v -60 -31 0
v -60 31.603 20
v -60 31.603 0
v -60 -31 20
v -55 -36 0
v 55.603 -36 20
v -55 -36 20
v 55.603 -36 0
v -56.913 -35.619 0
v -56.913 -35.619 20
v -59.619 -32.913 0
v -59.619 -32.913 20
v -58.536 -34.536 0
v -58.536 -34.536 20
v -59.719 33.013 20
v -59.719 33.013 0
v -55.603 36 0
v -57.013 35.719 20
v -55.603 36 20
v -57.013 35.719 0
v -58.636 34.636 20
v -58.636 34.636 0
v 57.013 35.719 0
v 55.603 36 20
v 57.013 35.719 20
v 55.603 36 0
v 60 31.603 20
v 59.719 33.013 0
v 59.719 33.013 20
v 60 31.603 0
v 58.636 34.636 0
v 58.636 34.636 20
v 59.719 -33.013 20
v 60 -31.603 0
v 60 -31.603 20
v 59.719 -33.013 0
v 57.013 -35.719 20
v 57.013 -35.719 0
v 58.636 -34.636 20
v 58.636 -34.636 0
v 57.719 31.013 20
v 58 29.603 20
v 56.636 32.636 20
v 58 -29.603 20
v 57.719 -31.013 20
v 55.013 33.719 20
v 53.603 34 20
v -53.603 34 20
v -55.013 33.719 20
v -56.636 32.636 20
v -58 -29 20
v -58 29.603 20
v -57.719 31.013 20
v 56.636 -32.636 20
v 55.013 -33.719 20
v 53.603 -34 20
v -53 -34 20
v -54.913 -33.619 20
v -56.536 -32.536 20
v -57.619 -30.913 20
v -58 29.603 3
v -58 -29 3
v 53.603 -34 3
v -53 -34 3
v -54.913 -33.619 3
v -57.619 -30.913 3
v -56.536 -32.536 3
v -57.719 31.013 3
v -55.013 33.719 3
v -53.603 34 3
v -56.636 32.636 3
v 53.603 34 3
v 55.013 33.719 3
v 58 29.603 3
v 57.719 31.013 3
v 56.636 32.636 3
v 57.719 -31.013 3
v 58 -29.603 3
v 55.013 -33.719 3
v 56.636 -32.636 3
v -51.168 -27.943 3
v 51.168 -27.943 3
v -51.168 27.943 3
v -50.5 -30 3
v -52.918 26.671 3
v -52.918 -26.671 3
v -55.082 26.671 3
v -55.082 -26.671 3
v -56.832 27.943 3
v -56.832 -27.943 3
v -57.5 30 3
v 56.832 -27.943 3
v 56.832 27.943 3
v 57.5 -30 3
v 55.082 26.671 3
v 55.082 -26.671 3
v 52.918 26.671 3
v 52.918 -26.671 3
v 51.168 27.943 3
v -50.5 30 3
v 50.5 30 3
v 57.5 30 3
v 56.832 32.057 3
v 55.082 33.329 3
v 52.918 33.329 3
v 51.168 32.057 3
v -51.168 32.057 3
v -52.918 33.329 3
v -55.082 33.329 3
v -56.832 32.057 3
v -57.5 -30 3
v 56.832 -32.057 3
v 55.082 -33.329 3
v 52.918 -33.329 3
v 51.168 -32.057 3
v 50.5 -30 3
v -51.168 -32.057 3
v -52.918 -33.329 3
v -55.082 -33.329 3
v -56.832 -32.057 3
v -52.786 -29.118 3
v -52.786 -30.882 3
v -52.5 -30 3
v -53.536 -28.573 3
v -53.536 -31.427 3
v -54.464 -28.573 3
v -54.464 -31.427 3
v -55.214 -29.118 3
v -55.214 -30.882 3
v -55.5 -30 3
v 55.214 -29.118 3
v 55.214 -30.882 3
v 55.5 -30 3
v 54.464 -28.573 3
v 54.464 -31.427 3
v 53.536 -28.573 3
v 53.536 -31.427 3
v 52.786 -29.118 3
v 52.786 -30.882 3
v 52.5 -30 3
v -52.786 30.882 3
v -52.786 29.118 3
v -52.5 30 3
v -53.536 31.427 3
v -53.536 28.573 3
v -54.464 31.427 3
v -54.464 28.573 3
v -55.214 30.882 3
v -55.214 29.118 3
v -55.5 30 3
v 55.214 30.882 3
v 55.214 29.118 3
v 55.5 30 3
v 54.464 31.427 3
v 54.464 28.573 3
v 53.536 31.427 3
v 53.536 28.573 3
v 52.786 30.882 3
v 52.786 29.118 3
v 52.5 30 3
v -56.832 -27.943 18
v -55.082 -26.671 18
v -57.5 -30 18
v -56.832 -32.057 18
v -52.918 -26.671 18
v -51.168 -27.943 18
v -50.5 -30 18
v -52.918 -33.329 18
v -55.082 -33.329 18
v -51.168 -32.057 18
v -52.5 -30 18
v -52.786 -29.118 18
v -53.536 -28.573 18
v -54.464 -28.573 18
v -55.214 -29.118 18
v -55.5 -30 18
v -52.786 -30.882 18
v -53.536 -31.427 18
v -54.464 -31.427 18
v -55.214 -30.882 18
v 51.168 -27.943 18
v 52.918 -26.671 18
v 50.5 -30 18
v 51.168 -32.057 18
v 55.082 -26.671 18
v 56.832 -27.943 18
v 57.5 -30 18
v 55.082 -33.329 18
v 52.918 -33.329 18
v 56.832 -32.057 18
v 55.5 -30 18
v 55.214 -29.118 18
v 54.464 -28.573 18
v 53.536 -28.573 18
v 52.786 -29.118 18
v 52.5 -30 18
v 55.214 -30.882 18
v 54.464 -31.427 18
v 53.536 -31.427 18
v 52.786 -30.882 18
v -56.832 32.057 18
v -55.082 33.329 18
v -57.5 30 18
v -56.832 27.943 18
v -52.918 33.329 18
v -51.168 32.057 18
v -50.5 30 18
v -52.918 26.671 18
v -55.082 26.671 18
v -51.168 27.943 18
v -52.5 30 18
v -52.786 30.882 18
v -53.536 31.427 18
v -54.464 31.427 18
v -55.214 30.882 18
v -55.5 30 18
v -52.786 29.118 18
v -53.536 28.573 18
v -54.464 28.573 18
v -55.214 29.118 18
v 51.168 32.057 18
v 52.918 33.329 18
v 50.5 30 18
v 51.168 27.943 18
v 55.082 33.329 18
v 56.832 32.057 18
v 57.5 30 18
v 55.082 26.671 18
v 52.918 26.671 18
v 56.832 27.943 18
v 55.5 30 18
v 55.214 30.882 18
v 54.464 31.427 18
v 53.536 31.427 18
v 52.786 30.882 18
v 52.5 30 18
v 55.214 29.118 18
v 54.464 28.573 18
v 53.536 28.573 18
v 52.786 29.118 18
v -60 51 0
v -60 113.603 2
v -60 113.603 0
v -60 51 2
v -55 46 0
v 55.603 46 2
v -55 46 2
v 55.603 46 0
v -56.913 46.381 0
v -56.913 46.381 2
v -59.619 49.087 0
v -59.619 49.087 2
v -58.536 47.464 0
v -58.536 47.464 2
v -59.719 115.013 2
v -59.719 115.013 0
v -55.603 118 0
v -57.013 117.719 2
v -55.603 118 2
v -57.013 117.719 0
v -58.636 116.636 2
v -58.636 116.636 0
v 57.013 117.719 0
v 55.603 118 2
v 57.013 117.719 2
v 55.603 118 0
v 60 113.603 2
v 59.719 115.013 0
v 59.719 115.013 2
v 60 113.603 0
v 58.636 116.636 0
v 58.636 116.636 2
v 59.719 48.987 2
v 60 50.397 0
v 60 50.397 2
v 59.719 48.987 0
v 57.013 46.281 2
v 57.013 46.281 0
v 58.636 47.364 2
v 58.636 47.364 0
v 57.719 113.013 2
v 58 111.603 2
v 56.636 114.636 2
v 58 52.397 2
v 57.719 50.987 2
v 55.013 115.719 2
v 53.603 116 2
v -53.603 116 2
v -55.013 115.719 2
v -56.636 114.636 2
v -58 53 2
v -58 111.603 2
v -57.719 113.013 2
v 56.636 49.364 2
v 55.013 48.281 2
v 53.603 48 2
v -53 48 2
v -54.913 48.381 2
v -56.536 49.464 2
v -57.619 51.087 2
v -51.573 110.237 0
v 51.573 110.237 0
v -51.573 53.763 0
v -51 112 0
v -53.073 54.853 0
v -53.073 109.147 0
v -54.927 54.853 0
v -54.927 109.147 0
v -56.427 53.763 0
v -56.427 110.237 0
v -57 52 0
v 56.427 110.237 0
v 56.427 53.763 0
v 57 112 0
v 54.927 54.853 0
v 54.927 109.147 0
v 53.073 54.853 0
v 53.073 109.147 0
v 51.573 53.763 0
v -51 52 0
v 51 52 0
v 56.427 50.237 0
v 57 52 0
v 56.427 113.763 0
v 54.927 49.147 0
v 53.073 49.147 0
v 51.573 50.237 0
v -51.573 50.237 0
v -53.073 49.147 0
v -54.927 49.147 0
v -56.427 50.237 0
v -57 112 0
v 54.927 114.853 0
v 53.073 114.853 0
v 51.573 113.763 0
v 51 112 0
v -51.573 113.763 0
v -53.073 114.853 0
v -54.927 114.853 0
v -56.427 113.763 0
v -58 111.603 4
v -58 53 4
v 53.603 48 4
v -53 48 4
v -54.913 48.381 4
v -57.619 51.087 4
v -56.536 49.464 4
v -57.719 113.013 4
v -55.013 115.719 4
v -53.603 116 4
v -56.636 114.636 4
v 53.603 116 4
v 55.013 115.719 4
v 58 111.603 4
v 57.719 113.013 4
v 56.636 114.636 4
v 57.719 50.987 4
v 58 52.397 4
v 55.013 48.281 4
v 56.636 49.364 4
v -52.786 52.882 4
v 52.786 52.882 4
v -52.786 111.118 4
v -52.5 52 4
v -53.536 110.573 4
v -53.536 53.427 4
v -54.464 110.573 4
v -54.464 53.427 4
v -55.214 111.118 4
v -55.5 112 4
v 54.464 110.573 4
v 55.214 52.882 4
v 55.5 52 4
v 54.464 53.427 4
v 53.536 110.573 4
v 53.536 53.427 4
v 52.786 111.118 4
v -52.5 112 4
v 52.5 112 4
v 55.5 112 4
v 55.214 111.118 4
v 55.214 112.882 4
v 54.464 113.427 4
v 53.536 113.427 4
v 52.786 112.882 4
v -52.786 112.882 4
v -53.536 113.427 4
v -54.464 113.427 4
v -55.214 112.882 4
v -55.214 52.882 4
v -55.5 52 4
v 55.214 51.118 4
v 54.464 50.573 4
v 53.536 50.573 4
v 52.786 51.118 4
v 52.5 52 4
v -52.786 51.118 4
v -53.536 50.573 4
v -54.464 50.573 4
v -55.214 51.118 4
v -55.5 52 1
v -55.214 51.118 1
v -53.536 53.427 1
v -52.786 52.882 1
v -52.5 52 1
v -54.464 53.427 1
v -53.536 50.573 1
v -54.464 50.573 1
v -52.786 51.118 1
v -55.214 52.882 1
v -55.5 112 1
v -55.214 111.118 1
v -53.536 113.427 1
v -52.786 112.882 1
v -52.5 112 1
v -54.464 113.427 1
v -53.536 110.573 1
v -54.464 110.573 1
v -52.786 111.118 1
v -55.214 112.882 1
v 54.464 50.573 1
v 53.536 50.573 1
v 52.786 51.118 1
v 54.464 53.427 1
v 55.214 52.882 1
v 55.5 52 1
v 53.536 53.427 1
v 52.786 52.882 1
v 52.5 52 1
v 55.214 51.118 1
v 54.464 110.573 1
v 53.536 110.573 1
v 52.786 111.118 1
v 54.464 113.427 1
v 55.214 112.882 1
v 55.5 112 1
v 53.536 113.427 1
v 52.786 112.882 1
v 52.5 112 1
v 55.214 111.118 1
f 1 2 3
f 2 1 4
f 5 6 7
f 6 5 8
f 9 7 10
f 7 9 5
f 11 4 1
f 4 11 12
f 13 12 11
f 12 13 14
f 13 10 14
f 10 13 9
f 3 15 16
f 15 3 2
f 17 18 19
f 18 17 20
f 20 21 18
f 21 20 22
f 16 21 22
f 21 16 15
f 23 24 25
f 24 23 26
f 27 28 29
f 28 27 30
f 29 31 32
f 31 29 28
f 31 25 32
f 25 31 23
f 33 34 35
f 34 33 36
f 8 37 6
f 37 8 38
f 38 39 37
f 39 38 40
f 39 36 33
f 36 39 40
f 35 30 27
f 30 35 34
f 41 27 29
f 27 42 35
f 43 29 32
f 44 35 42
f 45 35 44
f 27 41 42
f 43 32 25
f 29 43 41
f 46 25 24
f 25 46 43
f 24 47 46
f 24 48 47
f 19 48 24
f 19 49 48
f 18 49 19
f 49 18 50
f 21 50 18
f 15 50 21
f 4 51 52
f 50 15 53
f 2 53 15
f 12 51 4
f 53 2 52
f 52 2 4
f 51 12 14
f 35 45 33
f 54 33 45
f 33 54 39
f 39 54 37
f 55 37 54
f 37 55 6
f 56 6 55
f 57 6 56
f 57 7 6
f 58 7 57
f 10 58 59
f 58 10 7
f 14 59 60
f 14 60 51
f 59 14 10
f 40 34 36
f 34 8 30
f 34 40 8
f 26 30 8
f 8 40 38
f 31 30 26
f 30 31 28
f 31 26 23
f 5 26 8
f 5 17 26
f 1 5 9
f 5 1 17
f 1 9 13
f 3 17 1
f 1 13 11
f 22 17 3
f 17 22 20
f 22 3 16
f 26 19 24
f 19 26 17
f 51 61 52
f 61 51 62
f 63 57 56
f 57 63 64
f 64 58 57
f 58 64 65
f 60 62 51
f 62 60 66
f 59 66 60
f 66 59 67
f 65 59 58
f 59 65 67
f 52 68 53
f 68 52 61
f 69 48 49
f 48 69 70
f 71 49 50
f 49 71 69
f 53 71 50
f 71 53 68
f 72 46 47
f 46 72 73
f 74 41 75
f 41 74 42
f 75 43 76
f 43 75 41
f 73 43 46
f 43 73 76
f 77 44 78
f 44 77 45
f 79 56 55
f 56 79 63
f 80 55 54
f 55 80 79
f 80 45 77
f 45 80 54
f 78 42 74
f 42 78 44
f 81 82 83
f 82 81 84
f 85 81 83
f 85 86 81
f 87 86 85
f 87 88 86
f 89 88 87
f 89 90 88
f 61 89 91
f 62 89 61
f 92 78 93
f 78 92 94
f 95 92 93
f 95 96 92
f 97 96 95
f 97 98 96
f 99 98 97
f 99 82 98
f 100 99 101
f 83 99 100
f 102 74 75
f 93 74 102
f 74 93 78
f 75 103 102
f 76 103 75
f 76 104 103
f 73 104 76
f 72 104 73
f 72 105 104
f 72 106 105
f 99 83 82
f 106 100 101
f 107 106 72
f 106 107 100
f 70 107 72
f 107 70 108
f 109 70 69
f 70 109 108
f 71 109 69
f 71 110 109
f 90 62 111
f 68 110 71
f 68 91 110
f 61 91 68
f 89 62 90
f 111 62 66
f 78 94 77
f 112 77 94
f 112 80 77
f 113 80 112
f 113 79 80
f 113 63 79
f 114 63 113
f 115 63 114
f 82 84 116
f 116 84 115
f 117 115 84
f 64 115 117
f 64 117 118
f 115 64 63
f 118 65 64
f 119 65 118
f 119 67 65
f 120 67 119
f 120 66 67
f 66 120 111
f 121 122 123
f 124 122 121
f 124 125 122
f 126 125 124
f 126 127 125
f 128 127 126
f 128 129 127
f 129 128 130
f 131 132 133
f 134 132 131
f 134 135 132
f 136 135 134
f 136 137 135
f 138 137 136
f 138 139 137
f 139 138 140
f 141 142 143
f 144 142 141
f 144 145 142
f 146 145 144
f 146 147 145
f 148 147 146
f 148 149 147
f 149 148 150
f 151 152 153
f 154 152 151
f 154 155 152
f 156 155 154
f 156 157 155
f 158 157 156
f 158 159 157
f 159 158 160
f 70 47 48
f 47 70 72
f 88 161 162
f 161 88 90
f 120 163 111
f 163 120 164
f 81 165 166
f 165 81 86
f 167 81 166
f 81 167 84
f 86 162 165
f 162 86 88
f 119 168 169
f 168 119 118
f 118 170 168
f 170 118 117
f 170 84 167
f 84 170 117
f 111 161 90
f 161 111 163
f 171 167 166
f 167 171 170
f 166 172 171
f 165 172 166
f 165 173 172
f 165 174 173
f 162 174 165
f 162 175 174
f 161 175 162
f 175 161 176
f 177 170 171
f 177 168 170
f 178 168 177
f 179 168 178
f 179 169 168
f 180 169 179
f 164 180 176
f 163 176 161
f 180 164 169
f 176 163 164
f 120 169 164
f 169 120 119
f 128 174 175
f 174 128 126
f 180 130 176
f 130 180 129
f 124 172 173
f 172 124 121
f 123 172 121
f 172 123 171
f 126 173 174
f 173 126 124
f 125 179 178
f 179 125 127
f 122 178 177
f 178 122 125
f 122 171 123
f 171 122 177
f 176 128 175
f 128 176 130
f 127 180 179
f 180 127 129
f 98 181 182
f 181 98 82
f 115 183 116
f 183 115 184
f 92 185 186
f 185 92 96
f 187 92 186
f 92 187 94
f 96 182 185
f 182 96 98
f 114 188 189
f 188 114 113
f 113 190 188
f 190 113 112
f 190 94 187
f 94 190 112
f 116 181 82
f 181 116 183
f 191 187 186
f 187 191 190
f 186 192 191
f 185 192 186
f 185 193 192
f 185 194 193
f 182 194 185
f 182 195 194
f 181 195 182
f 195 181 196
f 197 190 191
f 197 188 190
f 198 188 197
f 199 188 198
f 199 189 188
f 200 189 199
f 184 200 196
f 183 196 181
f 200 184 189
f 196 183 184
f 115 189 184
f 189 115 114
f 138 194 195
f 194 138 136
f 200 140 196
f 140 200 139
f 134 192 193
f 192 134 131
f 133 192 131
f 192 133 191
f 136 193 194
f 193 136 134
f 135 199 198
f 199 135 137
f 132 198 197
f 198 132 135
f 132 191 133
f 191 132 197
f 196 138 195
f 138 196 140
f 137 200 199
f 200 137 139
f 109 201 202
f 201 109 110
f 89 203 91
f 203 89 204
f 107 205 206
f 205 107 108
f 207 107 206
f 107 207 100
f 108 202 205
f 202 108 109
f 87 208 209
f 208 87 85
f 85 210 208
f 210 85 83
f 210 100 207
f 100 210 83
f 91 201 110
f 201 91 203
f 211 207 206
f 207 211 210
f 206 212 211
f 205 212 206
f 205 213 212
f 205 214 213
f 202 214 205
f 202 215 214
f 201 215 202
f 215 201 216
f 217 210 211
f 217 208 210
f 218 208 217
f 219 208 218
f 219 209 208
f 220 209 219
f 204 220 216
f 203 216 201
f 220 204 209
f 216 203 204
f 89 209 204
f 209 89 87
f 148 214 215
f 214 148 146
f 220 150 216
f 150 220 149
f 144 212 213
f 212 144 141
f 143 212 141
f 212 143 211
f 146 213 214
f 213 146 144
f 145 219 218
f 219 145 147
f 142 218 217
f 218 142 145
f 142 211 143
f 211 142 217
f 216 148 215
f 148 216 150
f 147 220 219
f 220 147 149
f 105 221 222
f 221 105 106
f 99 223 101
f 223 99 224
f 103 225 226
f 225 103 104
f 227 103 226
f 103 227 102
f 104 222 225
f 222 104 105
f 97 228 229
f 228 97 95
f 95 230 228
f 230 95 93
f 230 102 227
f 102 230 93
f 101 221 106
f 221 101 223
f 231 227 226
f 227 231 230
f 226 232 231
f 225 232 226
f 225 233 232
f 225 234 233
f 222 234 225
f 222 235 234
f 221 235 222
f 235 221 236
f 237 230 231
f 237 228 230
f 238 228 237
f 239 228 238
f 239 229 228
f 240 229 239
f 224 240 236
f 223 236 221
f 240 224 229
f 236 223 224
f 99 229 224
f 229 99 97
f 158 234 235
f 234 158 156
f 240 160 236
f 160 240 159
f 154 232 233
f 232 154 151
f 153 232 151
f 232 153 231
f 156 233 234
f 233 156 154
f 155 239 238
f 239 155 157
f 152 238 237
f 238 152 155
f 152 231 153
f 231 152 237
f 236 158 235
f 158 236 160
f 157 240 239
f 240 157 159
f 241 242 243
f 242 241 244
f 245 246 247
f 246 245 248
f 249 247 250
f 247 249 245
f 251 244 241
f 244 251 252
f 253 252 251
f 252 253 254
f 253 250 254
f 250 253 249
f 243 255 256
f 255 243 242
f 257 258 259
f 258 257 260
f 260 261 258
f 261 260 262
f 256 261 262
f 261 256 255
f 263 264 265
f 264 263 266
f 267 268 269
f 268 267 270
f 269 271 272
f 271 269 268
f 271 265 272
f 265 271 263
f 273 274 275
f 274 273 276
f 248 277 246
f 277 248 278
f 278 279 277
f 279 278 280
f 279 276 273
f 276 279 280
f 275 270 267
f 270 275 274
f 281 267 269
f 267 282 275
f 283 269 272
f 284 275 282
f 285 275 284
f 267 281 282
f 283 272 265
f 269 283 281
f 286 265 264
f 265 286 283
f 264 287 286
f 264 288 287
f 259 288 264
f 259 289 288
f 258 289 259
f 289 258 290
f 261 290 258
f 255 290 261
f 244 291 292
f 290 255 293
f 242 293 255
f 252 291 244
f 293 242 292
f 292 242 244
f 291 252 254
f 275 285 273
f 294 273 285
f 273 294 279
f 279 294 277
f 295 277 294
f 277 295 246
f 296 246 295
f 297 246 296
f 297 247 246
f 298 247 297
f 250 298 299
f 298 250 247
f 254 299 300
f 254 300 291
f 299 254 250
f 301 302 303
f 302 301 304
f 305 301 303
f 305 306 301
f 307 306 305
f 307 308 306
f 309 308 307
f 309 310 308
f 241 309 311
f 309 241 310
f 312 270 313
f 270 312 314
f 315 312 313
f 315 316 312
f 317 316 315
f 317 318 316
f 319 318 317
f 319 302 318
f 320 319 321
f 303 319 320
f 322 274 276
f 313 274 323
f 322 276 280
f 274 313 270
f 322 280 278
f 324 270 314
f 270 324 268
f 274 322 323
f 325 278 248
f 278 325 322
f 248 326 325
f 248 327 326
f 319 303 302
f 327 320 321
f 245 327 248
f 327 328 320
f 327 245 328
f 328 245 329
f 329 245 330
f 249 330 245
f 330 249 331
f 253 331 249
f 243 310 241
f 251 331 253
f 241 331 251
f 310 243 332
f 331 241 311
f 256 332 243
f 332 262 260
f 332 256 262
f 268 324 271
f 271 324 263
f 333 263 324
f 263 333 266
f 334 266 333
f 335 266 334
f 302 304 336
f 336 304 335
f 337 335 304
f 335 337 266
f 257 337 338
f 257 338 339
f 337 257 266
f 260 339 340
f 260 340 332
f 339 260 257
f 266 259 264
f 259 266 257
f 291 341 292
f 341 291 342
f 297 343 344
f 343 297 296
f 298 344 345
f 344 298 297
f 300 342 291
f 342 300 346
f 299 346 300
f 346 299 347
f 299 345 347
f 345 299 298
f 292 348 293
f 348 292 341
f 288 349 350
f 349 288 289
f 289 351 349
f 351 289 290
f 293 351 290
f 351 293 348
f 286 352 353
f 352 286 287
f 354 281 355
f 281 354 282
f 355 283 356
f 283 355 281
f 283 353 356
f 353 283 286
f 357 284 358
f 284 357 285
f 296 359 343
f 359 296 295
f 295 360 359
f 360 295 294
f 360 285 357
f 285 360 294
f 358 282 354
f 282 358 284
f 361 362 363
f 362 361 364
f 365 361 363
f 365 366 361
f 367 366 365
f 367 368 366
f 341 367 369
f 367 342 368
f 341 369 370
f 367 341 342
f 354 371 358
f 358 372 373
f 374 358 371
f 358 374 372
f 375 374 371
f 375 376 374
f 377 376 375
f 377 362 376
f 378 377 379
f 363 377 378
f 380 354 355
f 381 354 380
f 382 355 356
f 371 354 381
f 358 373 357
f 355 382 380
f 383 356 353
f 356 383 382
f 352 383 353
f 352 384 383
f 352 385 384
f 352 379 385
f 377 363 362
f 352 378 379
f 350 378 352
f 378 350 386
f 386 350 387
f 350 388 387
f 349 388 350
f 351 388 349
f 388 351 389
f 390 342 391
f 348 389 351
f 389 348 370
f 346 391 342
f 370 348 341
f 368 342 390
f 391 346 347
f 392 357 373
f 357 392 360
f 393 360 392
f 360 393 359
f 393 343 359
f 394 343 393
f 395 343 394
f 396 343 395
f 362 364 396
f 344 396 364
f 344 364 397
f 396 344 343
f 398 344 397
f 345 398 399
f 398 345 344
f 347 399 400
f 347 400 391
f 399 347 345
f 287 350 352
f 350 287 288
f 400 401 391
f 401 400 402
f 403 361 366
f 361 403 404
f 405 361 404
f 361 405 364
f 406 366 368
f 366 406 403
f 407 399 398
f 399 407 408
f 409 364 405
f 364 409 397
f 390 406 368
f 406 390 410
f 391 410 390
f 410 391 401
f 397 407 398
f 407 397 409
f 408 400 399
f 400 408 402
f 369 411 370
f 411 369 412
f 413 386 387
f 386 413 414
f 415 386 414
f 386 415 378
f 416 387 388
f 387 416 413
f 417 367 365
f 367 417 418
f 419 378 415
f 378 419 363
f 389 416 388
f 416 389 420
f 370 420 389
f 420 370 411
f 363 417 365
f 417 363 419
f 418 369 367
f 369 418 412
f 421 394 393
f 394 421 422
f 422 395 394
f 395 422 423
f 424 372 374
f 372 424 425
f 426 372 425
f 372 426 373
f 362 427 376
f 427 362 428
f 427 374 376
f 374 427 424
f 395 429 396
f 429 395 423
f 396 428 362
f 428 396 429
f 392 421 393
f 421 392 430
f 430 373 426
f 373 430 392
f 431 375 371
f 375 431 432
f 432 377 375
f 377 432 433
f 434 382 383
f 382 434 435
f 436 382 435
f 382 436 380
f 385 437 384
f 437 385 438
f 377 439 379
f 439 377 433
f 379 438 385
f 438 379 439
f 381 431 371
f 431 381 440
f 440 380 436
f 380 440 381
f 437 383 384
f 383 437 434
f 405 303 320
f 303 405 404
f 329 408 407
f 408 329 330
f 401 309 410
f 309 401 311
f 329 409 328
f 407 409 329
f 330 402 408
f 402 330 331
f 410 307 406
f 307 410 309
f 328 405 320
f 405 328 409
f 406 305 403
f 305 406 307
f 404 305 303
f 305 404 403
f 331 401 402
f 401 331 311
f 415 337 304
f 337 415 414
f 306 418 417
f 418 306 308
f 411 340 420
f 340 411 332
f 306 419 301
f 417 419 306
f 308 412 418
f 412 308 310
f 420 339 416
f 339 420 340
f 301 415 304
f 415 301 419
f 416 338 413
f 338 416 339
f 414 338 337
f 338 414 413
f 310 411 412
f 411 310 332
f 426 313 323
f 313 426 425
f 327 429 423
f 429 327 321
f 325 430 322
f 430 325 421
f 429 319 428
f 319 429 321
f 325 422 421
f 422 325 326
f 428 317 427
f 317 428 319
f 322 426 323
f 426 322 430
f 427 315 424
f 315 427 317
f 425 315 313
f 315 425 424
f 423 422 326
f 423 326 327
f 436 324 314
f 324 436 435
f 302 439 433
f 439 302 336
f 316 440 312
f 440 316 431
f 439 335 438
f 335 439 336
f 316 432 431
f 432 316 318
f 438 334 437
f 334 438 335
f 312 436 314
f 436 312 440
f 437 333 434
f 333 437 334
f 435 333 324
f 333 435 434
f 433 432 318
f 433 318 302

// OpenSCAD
//
// Customized Enclosure
//

/*[Dimensions]*/

// Width of the enclosure
width = 120.0;
// Height of the enclosure
height = 72.0;
// Depth of the enclosure
depth = 20.0;
// Thickness of the walls and lid
thickness = 2;
// Amount of corner rounding
fillet_radius = 5.0;

/*[Hidden]*/

// Position offset from the corner for the stand-offs
standoff_offset = 0.5;
// Radius of the stand-offs
standoff_radius = 3.5;
// Radius of the hole in the stand-offs
standoff_hole_radius = 1.5;

// 
// builds a solid rectangle with rounded corners (Z-only)
//
module block(width, height, depth, fillet_radius) {
    
    difference() {
        cube([width, height, depth], center = true);
        
        fudge = 0.1;
        fudge_depth = depth + 1.0;
        
        translate([-(width / 2), -(height / 2), -(fudge_depth / 2)])
        intersection () {
            cube([fillet_radius, fillet_radius, fudge_depth], center = false); 
            difference() {
                    cube([2 * fillet_radius, 2 * fillet_radius, fudge_depth], center = false); 
                    translate([fillet_radius, fillet_radius, 0.0])
                    cylinder(r = fillet_radius, h = fudge_depth);
            }
        }

        translate([-(width / 2 + fudge), (height / 2 + fudge), -(fudge_depth / 2)])
        rotate([0.0, 0.0, -90])
        intersection () {
            cube([fillet_radius, fillet_radius, fudge_depth], center = false); 
            difference() {
                    cube([2 * fillet_radius, 2 * fillet_radius, fudge_depth], center = false); 
                    translate([fillet_radius, fillet_radius, 0.0])
                    cylinder(r = fillet_radius, h = fudge_depth);
            }
        }

        translate([(width / 2 + fudge), (height / 2 + fudge), -(fudge_depth / 2)])
        rotate([0.0, 0.0, 180])
        intersection () {
            cube([fillet_radius, fillet_radius, fudge_depth], center = false); 
            difference() {
                    cube([2 * fillet_radius, 2 * fillet_radius, fudge_depth], center = false); 
                    translate([fillet_radius, fillet_radius, 0.0])
                    cylinder(r = fillet_radius, h = fudge_depth);
            }
        }

        translate([(width / 2 + fudge), -(height / 2 + fudge), -(fudge_depth / 2)])
        rotate([0.0, 0.0, 90])
        intersection () {
            cube([fillet_radius, fillet_radius, fudge_depth], center = false); 
            difference() {
                    cube([2 * fillet_radius, 2 * fillet_radius, fudge_depth], center = false); 
                    translate([fillet_radius, fillet_radius, 0.0])
                    cylinder(r = fillet_radius, h = fudge_depth);
            }
        }
    }
}

module enclosure(width, height, depth, fillet_radius, thickness, standoff_offset, standoff_radius, standoff_hole_radius) {
    union() {
    
        translate([0.0, 0.0, depth / 2.0])
        difference() {
            block(width, height, depth, fillet_radius);
            translate([0.0, 0.0, thickness]) 
                block(width - (2 * thickness), height - (2 * thickness), depth - thickness, fillet_radius);
        }
        
        translate([-((width / 2) - (thickness + standoff_radius + standoff_offset)), -((height / 2) - (thickness + standoff_radius + standoff_offset)), thickness ])
        difference() {
            cylinder(r = standoff_radius, h = (depth - (2 * thickness)), $fn=10);
            cylinder(r = standoff_hole_radius, h = (depth - (2 * thickness)), $fn=10);
        }
    
        translate([((width / 2) - (thickness + standoff_radius + standoff_offset)), -((height / 2) - (thickness + standoff_radius + standoff_offset)), thickness ])
        difference() {
            cylinder(r = standoff_radius, h = (depth - (2 * thickness)), $fn=10);
            cylinder(r = standoff_hole_radius, h = (depth - (2 * thickness)), $fn=10);
        }

        translate([-((width / 2) - (thickness + standoff_radius + standoff_offset)), ((height / 2) - (thickness + standoff_radius + standoff_offset)), thickness ])
        difference() {
            cylinder(r = standoff_radius, h = (depth - (2 * thickness)), $fn=10);
            cylinder(r = standoff_hole_radius, h = (depth - (2 * thickness)), $fn=10);
        }

        translate([((width / 2) - (thickness + standoff_radius + standoff_offset)), ((height / 2) - (thickness + standoff_radius + standoff_offset)), thickness ])
        difference() {
            cylinder(r = standoff_radius, h = (depth - (2 * thickness)), $fn=10);
            cylinder(r = standoff_hole_radius, h = (depth - (2 * thickness)), $fn=10);
        }
        
    }
}

module lid(width, height, fillet_radius, thickness, standoff_offset, standoff_radius, standoff_hole_radius) {
    difference() {
    
        lid_offset = 10.0;
        
        union() {
            translate([0.0, height + lid_offset, thickness / 2.0])
                block(width, height, thickness, fillet_radius);
            translate([0.0, height + lid_offset, thickness / 2.0 + thickness])
                block(width - (2 * thickness), height - (2 * thickness), thickness, fillet_radius);
        }
        
        hole_offset = height + lid_offset;
        
        // holes 
        translate([-((width / 2) - (thickness + standoff_radius + standoff_offset)), -((height / 2) - (thickness + standoff_radius + standoff_offset)) + hole_offset, 0.0])
        cylinder(r = standoff_hole_radius, h = (2 * thickness), $fn=10);
        
        translate([-((width / 2) - (thickness + standoff_radius + standoff_offset)), ((height / 2) - (thickness + standoff_radius + standoff_offset)) + hole_offset, 0.0])
        cylinder(r = standoff_hole_radius, h = (2 * thickness), $fn=10);

        translate([((width / 2) - (thickness + standoff_radius + standoff_offset)), -((height / 2) - (thickness + standoff_radius + standoff_offset)) + hole_offset, 0.0])
        cylinder(r = standoff_hole_radius, h = (2 * thickness), $fn=10);

        translate([((width / 2) - (thickness + standoff_radius + standoff_offset)), ((height / 2) - (thickness + standoff_radius + standoff_offset)) + hole_offset, 0.0])
        cylinder(r = standoff_hole_radius, h = (2 * thickness), $fn=10);
        
        // countersinks
        translate([-((width / 2) - (thickness + standoff_radius + standoff_offset)), -((height / 2) - (thickness + standoff_radius + standoff_offset)) + hole_offset, 0.0])
        cylinder(r1 = standoff_hole_radius * 2, r2 = 0.0, h = thickness, $fn=10);
        
        translate([-((width / 2) - (thickness + standoff_radius + standoff_offset)), ((height / 2) - (thickness + standoff_radius + standoff_offset)) + hole_offset, 0.0])
        cylinder(r1 = standoff_hole_radius * 2, r2 = 0.0, h = thickness, $fn=10);

        translate([((width / 2) - (thickness + standoff_radius + standoff_offset)), -((height / 2) - (thickness + standoff_radius + standoff_offset)) + hole_offset, 0.0])
        cylinder(r1 = standoff_hole_radius * 2, r2 = 0.0, h = thickness, $fn=10);

        translate([((width / 2) - (thickness + standoff_radius + standoff_offset)), ((height / 2) - (thickness + standoff_radius + standoff_offset)) + hole_offset, 0.0])
        cylinder(r1 = standoff_hole_radius * 2, r2 = 0.0, h = thickness, $fn=10);
                
    }
}

enclosure(width, height, depth, fillet_radius, thickness, standoff_offset, standoff_radius, standoff_hole_radius);
lid(width, height, fillet_radius, thickness, standoff_offset, standoff_radius, standoff_hole_radius);
